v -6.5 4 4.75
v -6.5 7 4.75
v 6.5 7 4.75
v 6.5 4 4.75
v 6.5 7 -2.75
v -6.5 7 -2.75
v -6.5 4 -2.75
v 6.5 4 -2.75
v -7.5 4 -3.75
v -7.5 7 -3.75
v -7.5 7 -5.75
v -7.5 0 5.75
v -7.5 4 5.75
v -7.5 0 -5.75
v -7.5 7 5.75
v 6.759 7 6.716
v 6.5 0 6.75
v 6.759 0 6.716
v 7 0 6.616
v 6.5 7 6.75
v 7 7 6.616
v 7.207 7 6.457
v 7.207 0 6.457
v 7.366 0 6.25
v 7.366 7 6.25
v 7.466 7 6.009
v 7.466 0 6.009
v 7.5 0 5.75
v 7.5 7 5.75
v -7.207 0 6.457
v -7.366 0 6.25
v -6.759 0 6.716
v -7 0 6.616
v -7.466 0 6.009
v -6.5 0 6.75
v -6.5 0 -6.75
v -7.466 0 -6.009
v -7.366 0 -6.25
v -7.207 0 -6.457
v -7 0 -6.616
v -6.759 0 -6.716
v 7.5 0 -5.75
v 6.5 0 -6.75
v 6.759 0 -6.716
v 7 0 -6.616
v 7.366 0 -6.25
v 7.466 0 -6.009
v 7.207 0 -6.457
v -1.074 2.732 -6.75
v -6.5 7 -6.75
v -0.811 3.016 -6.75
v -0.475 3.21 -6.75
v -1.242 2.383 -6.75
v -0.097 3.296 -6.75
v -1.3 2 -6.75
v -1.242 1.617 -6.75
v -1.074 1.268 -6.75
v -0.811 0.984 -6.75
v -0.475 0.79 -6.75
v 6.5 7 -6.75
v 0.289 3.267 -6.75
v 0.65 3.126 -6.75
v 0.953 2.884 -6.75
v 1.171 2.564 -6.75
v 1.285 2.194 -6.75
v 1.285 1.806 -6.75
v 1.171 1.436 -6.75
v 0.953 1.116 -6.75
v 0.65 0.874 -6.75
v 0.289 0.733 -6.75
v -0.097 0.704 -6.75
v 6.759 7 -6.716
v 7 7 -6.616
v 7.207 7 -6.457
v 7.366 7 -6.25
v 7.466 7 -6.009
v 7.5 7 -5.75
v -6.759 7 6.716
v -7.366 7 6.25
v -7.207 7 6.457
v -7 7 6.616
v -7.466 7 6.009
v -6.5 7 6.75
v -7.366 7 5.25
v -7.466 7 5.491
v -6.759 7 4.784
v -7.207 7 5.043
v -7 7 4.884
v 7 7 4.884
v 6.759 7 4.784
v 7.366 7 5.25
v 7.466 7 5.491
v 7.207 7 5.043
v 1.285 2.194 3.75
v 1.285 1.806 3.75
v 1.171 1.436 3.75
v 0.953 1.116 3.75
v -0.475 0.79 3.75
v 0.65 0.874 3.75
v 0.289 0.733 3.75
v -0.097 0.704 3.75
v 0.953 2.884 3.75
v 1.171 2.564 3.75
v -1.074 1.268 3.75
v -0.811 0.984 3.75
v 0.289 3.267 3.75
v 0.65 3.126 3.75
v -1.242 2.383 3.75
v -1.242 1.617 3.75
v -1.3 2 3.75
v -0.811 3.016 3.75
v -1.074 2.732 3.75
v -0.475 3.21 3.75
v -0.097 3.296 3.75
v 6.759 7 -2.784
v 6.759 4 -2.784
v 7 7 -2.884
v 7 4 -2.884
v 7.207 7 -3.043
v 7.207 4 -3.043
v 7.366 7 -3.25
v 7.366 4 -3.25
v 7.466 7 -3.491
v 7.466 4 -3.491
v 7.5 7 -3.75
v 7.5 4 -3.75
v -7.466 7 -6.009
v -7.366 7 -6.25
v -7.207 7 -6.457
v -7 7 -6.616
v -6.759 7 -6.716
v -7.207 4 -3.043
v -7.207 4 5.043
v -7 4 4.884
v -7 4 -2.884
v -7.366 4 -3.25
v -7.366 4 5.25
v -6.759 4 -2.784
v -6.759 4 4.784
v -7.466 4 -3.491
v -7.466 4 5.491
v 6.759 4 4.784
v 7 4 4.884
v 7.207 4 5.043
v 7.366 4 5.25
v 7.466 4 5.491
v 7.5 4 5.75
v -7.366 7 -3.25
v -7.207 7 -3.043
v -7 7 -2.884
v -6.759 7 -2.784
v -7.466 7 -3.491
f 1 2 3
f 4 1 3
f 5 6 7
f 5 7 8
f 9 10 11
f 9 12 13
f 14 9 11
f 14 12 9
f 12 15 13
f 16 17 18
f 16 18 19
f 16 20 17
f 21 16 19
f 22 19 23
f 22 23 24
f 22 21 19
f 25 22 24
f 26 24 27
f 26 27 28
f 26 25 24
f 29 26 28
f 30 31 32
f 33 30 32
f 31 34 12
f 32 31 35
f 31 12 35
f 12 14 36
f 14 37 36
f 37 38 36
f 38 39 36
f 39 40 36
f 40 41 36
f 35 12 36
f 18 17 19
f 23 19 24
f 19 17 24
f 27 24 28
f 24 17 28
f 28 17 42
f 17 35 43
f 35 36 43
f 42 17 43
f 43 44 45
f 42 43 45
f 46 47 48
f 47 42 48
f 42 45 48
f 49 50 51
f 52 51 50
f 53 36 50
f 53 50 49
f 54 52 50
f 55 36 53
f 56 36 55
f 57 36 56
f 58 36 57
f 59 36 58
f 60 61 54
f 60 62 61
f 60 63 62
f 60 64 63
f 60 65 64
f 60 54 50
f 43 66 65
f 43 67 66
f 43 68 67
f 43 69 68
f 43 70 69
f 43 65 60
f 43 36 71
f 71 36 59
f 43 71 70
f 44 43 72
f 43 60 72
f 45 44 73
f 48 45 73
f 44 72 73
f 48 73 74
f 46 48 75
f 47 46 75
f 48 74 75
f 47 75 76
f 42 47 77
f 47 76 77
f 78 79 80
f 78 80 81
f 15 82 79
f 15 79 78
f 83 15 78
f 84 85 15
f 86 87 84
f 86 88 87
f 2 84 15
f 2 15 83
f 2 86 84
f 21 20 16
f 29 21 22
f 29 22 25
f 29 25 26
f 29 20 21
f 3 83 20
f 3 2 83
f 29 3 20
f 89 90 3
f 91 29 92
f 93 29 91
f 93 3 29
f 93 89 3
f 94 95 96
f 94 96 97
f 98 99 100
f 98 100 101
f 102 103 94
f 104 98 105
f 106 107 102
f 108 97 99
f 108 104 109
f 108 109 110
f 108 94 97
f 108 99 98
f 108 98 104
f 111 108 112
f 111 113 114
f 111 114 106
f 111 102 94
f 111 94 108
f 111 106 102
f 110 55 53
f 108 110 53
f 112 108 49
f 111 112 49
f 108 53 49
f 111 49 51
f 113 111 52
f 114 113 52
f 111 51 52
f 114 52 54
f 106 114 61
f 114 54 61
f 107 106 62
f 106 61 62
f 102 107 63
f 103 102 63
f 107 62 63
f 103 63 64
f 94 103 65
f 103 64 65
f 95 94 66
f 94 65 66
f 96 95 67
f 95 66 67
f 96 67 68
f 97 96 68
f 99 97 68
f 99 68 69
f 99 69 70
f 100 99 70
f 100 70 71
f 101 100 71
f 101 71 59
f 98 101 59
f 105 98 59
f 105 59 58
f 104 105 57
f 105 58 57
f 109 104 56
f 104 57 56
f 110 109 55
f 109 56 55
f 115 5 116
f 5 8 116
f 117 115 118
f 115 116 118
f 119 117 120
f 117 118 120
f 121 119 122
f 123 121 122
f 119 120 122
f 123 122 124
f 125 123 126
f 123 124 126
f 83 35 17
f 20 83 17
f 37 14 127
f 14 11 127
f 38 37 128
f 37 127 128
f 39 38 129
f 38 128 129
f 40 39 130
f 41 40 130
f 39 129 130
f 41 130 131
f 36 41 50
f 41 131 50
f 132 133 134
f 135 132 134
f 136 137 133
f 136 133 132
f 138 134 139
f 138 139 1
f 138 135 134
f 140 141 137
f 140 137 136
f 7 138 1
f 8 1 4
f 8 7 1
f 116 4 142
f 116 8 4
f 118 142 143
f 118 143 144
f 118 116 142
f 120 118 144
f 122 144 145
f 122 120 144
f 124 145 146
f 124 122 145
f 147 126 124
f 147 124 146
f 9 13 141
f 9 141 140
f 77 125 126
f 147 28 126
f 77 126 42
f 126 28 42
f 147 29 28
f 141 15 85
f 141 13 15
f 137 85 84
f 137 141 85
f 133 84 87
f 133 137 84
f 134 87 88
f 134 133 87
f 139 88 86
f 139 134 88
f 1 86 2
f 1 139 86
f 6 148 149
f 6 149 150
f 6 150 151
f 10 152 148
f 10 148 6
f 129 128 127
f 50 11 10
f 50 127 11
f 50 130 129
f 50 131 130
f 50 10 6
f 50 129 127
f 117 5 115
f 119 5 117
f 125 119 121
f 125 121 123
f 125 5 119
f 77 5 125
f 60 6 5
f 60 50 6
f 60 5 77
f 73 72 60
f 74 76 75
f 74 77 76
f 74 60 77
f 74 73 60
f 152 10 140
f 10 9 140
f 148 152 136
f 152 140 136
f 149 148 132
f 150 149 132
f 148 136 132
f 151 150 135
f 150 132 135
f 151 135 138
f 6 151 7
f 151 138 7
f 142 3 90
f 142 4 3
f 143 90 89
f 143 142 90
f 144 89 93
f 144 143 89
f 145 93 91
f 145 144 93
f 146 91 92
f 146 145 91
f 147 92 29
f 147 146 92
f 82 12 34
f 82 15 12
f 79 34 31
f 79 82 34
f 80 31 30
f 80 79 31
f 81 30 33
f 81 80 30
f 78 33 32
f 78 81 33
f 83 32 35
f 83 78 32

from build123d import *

# Parameters (mm, degrees)
SKETCH1_W           = 15
SKETCH1_H           = 13.5
BOSS_EXTRUDE1_DEPTH = 7
SKETCH2_W           = 15
SKETCH2_H           = 7.5
CUT_EXTRUDE2_DEPTH  = 3
SKETCH3_R           = 1.3
CUT_EXTRUDE3_DEPTH  = 10.5
FILLET1_R           = 1


with BuildPart() as part:
    # Sketch1 → Boss-Extrude1 (new body)
    with BuildSketch(Plane(origin=(0, 0, 0), x_dir=(1, 0, 0), z_dir=(0, 1, 0))):
        Rectangle(SKETCH1_W, SKETCH1_H)
    extrude(amount=BOSS_EXTRUDE1_DEPTH)

    # Sketch2 → Cut-Extrude2 (cut)
    with BuildSketch(Plane(origin=(0, 7, 0), x_dir=(1, 0, 0), z_dir=(0, 1, 0))):
        with Locations((0, -1)):
            Rectangle(SKETCH2_W, SKETCH2_H)
    extrude(amount=-CUT_EXTRUDE2_DEPTH, mode=Mode.SUBTRACT)

    # Sketch3 → Cut-Extrude3 (cut)
    with BuildSketch(Plane(origin=(0, 0, -6.75), x_dir=(-1, 0, 0), z_dir=(0, 0, -1))):
        with Locations((0, 2)):
            Circle(SKETCH3_R)
    extrude(amount=-CUT_EXTRUDE3_DEPTH, mode=Mode.SUBTRACT)

    # Fillet1
    fillet1_edges = [part.edges().sort_by_distance(p)[0] for p in [
        (7.5, 5.5, -2.75),
        (7.5, 5.5, 4.75),
        (-7.5, 5.5, 4.75),
        (-7.5, 5.5, -2.75),
        (7.5, 3.5, 6.75),
        (-7.5, 3.5, 6.75),
        (-7.5, 3.5, -6.75),
        (7.5, 3.5, -6.75),
    ]]
    fillet(fillet1_edges, radius=FILLET1_R - 0.0001)  # a hair under: the kernel refuses the full size


solid = part.part
